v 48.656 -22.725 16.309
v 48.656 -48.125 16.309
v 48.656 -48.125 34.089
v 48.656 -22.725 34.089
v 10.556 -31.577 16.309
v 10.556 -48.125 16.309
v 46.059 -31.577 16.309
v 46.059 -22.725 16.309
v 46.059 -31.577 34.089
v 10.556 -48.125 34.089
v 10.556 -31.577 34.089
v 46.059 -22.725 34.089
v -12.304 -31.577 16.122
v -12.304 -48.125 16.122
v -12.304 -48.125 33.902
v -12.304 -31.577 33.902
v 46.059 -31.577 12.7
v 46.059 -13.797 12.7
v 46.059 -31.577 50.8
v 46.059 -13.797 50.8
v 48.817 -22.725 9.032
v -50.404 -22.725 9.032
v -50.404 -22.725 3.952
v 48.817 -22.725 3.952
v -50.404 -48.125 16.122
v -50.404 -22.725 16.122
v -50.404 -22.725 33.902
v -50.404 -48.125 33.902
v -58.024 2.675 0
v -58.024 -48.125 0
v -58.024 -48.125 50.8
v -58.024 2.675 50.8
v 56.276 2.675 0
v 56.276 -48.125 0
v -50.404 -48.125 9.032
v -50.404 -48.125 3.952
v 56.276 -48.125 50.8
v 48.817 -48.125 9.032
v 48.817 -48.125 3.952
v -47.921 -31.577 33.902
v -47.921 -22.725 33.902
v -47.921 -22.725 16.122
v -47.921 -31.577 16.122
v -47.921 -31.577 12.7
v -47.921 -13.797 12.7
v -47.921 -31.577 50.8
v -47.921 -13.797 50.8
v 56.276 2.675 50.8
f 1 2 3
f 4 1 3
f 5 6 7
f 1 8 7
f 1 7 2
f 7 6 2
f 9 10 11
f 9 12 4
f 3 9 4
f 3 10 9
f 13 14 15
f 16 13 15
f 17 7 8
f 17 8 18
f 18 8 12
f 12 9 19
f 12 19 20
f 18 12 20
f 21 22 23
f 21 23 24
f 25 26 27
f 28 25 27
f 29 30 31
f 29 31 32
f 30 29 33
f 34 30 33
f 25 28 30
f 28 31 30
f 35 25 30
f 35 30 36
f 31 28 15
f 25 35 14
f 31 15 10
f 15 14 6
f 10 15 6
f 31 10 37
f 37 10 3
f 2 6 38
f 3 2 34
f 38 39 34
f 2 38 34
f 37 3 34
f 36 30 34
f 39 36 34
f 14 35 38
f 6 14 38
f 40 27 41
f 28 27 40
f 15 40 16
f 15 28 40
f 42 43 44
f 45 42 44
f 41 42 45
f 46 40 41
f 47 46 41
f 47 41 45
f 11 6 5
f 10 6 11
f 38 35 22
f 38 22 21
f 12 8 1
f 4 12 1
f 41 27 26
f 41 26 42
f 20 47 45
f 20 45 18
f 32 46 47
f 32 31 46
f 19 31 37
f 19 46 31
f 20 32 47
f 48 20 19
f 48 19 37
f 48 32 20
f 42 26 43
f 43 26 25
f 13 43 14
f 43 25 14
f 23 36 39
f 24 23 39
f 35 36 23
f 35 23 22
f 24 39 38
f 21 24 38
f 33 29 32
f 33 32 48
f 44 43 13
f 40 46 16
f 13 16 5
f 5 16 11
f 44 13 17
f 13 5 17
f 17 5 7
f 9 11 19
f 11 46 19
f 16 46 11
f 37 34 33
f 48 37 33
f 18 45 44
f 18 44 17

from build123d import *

# Parameters (mm, degrees)
F0_W     = 114.3
F0_H     = 50.8
F1_DEPTH = 50.8
F2_W     = 93.98
F2_H     = 17.78
F3_DEPTH = 38.1
F4_W     = 38.1
F4_H     = 17.78
F4_W_2   = 99.221253
F4_H_2   = 5.08
F5_DEPTH = 25.4
F6_DEPTH = 25.4


with BuildPart() as f1:
    # F0 (on Top) → F1 (new body)
    with BuildSketch(Plane.XY):
        with Locations((-0.874427, -22.725493)):
            Rectangle(F0_W, F0_H)
    extrude(amount=F1_DEPTH)

    # F2 (on face) → F3 (cut)
    with BuildSketch(Plane.XY.offset(50.8)):
        with Locations((-0.930555, -22.686988)):
            Rectangle(F2_W, F2_H)
    extrude(amount=-F3_DEPTH, mode=Mode.SUBTRACT)

    # F4 (on face) → F5 (cut)
    with BuildSketch(Plane.XZ.offset(48.125493)):
        with Locations((29.605573, 25.199144)):
            Rectangle(F4_W, F4_H)
        with Locations((-31.354427, 25.012475)):
            Rectangle(F4_W, F4_H)
        with Locations((-0.7938, 6.492384)):
            Rectangle(F4_W_2, F4_H_2)
    extrude(amount=-F5_DEPTH, mode=Mode.SUBTRACT)

    # F4 (on face) → F6 (cut)
    with BuildSketch(Plane.XZ.offset(48.125493)):
        with Locations((29.605573, 25.199144)):
            Rectangle(F4_W, F4_H)
        with Locations((-31.354427, 25.012475)):
            Rectangle(F4_W, F4_H)
        with Locations((-0.7938, 6.492384)):
            Rectangle(F4_W_2, F4_H_2)
    extrude(amount=-F6_DEPTH, mode=Mode.SUBTRACT)


solid = f1.part
